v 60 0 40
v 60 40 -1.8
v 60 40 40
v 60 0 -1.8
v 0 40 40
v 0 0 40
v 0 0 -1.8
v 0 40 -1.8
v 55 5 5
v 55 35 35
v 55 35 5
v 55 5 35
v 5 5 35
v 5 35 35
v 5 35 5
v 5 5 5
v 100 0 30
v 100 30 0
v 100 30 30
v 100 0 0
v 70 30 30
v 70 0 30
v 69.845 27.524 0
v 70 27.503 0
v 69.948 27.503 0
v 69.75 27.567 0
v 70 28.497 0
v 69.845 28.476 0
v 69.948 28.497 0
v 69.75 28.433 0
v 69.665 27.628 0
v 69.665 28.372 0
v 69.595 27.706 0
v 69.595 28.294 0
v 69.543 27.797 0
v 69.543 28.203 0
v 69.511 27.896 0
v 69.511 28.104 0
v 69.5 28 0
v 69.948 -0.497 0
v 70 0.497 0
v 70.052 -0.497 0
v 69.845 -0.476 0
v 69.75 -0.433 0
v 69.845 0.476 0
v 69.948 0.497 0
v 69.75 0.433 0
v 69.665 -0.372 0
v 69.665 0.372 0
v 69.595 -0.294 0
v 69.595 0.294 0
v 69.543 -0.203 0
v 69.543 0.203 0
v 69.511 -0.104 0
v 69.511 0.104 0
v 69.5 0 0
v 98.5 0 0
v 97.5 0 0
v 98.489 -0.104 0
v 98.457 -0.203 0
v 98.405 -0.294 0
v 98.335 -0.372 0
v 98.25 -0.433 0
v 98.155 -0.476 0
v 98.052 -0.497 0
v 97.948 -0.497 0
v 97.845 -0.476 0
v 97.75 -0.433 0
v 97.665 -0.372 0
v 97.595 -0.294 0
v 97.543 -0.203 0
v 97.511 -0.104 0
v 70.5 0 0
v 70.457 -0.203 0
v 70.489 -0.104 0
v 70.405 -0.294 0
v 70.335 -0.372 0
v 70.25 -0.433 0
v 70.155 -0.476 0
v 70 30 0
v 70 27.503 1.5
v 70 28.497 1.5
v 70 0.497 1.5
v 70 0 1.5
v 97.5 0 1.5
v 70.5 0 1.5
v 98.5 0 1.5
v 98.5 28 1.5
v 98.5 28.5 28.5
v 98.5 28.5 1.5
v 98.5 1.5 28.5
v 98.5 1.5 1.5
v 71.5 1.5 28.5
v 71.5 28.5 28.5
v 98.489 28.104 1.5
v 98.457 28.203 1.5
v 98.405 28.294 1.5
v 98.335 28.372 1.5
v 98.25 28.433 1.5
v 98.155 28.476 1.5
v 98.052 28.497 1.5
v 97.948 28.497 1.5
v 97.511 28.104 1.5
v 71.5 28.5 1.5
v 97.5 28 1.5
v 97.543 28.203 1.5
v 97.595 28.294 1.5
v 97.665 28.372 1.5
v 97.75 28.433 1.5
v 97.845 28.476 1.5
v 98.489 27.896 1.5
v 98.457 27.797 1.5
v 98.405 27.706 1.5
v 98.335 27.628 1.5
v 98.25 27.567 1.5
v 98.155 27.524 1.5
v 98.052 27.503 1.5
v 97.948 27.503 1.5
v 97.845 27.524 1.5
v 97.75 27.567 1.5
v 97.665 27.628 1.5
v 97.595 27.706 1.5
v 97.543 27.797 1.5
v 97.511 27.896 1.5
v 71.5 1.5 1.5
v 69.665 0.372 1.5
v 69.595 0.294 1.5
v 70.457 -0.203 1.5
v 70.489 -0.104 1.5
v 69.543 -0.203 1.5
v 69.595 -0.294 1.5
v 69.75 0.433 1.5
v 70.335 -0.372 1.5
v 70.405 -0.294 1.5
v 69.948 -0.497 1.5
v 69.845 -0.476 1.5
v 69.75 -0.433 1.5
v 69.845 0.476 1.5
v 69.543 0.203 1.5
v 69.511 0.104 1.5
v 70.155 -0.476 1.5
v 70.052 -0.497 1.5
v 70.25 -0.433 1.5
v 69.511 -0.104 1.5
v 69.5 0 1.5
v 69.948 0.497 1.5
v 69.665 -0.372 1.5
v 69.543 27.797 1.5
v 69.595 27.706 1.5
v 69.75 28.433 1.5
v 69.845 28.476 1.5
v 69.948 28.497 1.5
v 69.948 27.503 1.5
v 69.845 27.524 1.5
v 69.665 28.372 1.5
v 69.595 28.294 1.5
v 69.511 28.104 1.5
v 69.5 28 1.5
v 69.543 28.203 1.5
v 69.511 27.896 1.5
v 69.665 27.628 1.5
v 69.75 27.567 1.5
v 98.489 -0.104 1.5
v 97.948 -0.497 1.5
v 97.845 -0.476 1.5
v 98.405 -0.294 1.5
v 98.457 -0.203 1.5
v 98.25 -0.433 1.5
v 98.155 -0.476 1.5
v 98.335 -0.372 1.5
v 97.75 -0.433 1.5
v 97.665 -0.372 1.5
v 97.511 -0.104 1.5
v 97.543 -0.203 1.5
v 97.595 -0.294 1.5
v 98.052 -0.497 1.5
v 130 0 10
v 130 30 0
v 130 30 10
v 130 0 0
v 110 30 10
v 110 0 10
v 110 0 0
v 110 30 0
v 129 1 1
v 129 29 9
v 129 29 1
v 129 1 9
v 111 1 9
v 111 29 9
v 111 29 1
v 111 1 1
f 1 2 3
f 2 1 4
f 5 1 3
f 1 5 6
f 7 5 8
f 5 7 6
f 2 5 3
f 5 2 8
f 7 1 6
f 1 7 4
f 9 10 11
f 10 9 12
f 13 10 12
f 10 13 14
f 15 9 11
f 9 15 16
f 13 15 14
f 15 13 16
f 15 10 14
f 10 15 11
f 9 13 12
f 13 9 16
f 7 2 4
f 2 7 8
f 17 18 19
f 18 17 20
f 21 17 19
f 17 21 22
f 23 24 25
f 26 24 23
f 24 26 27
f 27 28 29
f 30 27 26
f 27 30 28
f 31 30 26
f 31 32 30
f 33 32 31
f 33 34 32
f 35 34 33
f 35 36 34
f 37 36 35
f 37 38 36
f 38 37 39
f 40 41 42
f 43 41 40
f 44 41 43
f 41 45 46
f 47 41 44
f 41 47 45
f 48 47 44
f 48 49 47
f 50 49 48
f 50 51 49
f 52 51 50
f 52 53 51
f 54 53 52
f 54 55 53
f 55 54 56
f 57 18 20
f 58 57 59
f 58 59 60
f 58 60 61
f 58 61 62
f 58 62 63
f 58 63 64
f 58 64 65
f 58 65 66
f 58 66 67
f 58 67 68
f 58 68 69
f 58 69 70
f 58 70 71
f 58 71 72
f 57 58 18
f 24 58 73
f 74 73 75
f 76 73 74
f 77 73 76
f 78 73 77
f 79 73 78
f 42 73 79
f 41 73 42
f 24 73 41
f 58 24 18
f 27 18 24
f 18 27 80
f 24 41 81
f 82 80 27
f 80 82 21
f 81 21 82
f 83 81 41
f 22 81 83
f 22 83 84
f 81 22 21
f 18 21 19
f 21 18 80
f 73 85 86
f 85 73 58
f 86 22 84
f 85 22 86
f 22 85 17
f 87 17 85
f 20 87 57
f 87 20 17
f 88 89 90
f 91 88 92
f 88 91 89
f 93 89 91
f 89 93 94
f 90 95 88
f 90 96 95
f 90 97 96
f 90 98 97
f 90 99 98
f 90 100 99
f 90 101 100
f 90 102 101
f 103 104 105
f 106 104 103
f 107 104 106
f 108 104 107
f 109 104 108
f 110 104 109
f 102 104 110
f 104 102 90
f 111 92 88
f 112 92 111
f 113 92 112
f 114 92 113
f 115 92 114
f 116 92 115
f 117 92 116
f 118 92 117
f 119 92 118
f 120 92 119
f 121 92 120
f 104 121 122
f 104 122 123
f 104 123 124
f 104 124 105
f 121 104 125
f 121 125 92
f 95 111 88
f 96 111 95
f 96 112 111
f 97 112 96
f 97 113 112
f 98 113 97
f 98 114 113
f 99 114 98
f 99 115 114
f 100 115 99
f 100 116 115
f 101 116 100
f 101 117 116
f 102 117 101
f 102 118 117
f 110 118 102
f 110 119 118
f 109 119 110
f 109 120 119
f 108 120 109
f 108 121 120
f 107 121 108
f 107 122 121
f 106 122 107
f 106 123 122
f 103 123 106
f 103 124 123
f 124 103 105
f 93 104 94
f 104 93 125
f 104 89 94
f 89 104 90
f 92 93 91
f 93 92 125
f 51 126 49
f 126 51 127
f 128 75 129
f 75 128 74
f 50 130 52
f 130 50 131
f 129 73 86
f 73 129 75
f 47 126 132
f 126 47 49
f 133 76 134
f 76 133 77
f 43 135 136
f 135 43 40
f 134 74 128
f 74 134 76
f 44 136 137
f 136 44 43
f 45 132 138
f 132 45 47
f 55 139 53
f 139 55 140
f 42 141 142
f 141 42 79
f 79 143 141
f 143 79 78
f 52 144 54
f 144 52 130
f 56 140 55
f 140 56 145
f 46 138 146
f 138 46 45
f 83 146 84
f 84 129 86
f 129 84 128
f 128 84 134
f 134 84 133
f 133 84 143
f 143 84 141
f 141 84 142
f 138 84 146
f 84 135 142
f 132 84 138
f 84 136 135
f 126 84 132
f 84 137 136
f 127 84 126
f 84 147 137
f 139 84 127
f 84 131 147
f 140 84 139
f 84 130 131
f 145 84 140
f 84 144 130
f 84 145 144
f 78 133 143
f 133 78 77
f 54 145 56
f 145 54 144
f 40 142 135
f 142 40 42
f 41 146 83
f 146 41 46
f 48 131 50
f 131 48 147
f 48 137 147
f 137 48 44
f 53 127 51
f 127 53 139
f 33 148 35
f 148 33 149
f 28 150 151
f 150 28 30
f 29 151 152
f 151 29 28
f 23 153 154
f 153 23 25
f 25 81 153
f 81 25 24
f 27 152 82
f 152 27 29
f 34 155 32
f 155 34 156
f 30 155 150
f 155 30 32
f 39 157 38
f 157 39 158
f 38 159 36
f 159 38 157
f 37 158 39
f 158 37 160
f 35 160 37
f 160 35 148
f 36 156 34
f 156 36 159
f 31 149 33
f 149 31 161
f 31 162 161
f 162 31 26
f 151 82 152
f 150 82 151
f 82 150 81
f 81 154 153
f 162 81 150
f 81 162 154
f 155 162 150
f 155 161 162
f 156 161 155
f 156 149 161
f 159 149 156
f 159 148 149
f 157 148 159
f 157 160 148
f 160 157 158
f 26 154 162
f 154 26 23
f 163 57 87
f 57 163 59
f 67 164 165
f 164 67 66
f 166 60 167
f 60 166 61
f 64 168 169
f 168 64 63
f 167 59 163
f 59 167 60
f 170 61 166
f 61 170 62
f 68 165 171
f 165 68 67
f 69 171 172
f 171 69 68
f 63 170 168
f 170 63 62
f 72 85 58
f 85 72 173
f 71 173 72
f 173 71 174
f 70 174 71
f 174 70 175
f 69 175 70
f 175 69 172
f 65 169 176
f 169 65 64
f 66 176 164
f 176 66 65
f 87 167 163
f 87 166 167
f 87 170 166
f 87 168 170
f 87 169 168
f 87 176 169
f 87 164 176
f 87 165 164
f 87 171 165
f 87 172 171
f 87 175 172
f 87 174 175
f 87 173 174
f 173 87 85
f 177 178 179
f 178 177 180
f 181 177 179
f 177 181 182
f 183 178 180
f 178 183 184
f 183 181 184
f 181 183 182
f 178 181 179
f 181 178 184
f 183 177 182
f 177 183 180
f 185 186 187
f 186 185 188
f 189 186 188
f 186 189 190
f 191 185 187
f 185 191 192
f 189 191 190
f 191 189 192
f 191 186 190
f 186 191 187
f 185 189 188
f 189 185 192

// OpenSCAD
// 🔥 EmberNest Furniture Blocks – Parametric OpenSCAD Module
// Path: /3d/furniture_blocks.scad
// Version: v0.2a
// License: OpenFlame (CC BY 4.0 + Symbolic Rider)
// Usage: Load into OpenSCAD or compatible 3D param tool

///////////////////////////
// ⚙️ Configurable Params //
///////////////////////////

unit_thickness = 1.8;        // cm, board/panel thickness
seat_height    = 40;         // cm
seat_depth     = 40;
seat_width     = 60;

block_width    = 30;
block_height   = 30;
block_depth    = 30;

$fn = 30; // smooth edges

/////////////////////
// 🪑 Fold-Flat Bench
/////////////////////

module fold_flat_bench() {
    difference() {
        cube([seat_width, seat_depth, seat_height]);
        translate([5, 5, 5])
            cube([seat_width - 10, seat_depth - 10, seat_height - 10]);
    }
    // optional: add under-storage
    translate([0, 0, -unit_thickness])
        cube([seat_width, seat_depth, unit_thickness]); // base lip
}

/////////////////////////
// 📦 Modular Storage Block
/////////////////////////

module storage_block() {
    difference() {
        cube([block_width, block_depth, block_height]);
        translate([1.5, 1.5, 1.5])
            cube([block_width - 3, block_depth - 3, block_height - 3]);
    }
    // magnetic feet mounts
    for (x=[0, block_width-2])
      for (y=[0, block_depth-2])
        translate([x, y, 0])
          cylinder(h=1.5, r=0.5);
}

///////////////////////////////
// ✨ Ritual Drawer (Optional)
///////////////////////////////

module ritual_drawer(width=20, depth=30, height=10) {
    color("crimson")
    difference() {
        cube([width, depth, height]);
        translate([1, 1, 1])
            cube([width - 2, depth - 2, height - 2]);
    }
}

///////////////////////////////
// 🔧 Preview Assembly
///////////////////////////////

translate([0, 0, 0]) fold_flat_bench();
translate([70, 0, 0]) storage_block();
translate([110, 0, 0]) ritual_drawer();
